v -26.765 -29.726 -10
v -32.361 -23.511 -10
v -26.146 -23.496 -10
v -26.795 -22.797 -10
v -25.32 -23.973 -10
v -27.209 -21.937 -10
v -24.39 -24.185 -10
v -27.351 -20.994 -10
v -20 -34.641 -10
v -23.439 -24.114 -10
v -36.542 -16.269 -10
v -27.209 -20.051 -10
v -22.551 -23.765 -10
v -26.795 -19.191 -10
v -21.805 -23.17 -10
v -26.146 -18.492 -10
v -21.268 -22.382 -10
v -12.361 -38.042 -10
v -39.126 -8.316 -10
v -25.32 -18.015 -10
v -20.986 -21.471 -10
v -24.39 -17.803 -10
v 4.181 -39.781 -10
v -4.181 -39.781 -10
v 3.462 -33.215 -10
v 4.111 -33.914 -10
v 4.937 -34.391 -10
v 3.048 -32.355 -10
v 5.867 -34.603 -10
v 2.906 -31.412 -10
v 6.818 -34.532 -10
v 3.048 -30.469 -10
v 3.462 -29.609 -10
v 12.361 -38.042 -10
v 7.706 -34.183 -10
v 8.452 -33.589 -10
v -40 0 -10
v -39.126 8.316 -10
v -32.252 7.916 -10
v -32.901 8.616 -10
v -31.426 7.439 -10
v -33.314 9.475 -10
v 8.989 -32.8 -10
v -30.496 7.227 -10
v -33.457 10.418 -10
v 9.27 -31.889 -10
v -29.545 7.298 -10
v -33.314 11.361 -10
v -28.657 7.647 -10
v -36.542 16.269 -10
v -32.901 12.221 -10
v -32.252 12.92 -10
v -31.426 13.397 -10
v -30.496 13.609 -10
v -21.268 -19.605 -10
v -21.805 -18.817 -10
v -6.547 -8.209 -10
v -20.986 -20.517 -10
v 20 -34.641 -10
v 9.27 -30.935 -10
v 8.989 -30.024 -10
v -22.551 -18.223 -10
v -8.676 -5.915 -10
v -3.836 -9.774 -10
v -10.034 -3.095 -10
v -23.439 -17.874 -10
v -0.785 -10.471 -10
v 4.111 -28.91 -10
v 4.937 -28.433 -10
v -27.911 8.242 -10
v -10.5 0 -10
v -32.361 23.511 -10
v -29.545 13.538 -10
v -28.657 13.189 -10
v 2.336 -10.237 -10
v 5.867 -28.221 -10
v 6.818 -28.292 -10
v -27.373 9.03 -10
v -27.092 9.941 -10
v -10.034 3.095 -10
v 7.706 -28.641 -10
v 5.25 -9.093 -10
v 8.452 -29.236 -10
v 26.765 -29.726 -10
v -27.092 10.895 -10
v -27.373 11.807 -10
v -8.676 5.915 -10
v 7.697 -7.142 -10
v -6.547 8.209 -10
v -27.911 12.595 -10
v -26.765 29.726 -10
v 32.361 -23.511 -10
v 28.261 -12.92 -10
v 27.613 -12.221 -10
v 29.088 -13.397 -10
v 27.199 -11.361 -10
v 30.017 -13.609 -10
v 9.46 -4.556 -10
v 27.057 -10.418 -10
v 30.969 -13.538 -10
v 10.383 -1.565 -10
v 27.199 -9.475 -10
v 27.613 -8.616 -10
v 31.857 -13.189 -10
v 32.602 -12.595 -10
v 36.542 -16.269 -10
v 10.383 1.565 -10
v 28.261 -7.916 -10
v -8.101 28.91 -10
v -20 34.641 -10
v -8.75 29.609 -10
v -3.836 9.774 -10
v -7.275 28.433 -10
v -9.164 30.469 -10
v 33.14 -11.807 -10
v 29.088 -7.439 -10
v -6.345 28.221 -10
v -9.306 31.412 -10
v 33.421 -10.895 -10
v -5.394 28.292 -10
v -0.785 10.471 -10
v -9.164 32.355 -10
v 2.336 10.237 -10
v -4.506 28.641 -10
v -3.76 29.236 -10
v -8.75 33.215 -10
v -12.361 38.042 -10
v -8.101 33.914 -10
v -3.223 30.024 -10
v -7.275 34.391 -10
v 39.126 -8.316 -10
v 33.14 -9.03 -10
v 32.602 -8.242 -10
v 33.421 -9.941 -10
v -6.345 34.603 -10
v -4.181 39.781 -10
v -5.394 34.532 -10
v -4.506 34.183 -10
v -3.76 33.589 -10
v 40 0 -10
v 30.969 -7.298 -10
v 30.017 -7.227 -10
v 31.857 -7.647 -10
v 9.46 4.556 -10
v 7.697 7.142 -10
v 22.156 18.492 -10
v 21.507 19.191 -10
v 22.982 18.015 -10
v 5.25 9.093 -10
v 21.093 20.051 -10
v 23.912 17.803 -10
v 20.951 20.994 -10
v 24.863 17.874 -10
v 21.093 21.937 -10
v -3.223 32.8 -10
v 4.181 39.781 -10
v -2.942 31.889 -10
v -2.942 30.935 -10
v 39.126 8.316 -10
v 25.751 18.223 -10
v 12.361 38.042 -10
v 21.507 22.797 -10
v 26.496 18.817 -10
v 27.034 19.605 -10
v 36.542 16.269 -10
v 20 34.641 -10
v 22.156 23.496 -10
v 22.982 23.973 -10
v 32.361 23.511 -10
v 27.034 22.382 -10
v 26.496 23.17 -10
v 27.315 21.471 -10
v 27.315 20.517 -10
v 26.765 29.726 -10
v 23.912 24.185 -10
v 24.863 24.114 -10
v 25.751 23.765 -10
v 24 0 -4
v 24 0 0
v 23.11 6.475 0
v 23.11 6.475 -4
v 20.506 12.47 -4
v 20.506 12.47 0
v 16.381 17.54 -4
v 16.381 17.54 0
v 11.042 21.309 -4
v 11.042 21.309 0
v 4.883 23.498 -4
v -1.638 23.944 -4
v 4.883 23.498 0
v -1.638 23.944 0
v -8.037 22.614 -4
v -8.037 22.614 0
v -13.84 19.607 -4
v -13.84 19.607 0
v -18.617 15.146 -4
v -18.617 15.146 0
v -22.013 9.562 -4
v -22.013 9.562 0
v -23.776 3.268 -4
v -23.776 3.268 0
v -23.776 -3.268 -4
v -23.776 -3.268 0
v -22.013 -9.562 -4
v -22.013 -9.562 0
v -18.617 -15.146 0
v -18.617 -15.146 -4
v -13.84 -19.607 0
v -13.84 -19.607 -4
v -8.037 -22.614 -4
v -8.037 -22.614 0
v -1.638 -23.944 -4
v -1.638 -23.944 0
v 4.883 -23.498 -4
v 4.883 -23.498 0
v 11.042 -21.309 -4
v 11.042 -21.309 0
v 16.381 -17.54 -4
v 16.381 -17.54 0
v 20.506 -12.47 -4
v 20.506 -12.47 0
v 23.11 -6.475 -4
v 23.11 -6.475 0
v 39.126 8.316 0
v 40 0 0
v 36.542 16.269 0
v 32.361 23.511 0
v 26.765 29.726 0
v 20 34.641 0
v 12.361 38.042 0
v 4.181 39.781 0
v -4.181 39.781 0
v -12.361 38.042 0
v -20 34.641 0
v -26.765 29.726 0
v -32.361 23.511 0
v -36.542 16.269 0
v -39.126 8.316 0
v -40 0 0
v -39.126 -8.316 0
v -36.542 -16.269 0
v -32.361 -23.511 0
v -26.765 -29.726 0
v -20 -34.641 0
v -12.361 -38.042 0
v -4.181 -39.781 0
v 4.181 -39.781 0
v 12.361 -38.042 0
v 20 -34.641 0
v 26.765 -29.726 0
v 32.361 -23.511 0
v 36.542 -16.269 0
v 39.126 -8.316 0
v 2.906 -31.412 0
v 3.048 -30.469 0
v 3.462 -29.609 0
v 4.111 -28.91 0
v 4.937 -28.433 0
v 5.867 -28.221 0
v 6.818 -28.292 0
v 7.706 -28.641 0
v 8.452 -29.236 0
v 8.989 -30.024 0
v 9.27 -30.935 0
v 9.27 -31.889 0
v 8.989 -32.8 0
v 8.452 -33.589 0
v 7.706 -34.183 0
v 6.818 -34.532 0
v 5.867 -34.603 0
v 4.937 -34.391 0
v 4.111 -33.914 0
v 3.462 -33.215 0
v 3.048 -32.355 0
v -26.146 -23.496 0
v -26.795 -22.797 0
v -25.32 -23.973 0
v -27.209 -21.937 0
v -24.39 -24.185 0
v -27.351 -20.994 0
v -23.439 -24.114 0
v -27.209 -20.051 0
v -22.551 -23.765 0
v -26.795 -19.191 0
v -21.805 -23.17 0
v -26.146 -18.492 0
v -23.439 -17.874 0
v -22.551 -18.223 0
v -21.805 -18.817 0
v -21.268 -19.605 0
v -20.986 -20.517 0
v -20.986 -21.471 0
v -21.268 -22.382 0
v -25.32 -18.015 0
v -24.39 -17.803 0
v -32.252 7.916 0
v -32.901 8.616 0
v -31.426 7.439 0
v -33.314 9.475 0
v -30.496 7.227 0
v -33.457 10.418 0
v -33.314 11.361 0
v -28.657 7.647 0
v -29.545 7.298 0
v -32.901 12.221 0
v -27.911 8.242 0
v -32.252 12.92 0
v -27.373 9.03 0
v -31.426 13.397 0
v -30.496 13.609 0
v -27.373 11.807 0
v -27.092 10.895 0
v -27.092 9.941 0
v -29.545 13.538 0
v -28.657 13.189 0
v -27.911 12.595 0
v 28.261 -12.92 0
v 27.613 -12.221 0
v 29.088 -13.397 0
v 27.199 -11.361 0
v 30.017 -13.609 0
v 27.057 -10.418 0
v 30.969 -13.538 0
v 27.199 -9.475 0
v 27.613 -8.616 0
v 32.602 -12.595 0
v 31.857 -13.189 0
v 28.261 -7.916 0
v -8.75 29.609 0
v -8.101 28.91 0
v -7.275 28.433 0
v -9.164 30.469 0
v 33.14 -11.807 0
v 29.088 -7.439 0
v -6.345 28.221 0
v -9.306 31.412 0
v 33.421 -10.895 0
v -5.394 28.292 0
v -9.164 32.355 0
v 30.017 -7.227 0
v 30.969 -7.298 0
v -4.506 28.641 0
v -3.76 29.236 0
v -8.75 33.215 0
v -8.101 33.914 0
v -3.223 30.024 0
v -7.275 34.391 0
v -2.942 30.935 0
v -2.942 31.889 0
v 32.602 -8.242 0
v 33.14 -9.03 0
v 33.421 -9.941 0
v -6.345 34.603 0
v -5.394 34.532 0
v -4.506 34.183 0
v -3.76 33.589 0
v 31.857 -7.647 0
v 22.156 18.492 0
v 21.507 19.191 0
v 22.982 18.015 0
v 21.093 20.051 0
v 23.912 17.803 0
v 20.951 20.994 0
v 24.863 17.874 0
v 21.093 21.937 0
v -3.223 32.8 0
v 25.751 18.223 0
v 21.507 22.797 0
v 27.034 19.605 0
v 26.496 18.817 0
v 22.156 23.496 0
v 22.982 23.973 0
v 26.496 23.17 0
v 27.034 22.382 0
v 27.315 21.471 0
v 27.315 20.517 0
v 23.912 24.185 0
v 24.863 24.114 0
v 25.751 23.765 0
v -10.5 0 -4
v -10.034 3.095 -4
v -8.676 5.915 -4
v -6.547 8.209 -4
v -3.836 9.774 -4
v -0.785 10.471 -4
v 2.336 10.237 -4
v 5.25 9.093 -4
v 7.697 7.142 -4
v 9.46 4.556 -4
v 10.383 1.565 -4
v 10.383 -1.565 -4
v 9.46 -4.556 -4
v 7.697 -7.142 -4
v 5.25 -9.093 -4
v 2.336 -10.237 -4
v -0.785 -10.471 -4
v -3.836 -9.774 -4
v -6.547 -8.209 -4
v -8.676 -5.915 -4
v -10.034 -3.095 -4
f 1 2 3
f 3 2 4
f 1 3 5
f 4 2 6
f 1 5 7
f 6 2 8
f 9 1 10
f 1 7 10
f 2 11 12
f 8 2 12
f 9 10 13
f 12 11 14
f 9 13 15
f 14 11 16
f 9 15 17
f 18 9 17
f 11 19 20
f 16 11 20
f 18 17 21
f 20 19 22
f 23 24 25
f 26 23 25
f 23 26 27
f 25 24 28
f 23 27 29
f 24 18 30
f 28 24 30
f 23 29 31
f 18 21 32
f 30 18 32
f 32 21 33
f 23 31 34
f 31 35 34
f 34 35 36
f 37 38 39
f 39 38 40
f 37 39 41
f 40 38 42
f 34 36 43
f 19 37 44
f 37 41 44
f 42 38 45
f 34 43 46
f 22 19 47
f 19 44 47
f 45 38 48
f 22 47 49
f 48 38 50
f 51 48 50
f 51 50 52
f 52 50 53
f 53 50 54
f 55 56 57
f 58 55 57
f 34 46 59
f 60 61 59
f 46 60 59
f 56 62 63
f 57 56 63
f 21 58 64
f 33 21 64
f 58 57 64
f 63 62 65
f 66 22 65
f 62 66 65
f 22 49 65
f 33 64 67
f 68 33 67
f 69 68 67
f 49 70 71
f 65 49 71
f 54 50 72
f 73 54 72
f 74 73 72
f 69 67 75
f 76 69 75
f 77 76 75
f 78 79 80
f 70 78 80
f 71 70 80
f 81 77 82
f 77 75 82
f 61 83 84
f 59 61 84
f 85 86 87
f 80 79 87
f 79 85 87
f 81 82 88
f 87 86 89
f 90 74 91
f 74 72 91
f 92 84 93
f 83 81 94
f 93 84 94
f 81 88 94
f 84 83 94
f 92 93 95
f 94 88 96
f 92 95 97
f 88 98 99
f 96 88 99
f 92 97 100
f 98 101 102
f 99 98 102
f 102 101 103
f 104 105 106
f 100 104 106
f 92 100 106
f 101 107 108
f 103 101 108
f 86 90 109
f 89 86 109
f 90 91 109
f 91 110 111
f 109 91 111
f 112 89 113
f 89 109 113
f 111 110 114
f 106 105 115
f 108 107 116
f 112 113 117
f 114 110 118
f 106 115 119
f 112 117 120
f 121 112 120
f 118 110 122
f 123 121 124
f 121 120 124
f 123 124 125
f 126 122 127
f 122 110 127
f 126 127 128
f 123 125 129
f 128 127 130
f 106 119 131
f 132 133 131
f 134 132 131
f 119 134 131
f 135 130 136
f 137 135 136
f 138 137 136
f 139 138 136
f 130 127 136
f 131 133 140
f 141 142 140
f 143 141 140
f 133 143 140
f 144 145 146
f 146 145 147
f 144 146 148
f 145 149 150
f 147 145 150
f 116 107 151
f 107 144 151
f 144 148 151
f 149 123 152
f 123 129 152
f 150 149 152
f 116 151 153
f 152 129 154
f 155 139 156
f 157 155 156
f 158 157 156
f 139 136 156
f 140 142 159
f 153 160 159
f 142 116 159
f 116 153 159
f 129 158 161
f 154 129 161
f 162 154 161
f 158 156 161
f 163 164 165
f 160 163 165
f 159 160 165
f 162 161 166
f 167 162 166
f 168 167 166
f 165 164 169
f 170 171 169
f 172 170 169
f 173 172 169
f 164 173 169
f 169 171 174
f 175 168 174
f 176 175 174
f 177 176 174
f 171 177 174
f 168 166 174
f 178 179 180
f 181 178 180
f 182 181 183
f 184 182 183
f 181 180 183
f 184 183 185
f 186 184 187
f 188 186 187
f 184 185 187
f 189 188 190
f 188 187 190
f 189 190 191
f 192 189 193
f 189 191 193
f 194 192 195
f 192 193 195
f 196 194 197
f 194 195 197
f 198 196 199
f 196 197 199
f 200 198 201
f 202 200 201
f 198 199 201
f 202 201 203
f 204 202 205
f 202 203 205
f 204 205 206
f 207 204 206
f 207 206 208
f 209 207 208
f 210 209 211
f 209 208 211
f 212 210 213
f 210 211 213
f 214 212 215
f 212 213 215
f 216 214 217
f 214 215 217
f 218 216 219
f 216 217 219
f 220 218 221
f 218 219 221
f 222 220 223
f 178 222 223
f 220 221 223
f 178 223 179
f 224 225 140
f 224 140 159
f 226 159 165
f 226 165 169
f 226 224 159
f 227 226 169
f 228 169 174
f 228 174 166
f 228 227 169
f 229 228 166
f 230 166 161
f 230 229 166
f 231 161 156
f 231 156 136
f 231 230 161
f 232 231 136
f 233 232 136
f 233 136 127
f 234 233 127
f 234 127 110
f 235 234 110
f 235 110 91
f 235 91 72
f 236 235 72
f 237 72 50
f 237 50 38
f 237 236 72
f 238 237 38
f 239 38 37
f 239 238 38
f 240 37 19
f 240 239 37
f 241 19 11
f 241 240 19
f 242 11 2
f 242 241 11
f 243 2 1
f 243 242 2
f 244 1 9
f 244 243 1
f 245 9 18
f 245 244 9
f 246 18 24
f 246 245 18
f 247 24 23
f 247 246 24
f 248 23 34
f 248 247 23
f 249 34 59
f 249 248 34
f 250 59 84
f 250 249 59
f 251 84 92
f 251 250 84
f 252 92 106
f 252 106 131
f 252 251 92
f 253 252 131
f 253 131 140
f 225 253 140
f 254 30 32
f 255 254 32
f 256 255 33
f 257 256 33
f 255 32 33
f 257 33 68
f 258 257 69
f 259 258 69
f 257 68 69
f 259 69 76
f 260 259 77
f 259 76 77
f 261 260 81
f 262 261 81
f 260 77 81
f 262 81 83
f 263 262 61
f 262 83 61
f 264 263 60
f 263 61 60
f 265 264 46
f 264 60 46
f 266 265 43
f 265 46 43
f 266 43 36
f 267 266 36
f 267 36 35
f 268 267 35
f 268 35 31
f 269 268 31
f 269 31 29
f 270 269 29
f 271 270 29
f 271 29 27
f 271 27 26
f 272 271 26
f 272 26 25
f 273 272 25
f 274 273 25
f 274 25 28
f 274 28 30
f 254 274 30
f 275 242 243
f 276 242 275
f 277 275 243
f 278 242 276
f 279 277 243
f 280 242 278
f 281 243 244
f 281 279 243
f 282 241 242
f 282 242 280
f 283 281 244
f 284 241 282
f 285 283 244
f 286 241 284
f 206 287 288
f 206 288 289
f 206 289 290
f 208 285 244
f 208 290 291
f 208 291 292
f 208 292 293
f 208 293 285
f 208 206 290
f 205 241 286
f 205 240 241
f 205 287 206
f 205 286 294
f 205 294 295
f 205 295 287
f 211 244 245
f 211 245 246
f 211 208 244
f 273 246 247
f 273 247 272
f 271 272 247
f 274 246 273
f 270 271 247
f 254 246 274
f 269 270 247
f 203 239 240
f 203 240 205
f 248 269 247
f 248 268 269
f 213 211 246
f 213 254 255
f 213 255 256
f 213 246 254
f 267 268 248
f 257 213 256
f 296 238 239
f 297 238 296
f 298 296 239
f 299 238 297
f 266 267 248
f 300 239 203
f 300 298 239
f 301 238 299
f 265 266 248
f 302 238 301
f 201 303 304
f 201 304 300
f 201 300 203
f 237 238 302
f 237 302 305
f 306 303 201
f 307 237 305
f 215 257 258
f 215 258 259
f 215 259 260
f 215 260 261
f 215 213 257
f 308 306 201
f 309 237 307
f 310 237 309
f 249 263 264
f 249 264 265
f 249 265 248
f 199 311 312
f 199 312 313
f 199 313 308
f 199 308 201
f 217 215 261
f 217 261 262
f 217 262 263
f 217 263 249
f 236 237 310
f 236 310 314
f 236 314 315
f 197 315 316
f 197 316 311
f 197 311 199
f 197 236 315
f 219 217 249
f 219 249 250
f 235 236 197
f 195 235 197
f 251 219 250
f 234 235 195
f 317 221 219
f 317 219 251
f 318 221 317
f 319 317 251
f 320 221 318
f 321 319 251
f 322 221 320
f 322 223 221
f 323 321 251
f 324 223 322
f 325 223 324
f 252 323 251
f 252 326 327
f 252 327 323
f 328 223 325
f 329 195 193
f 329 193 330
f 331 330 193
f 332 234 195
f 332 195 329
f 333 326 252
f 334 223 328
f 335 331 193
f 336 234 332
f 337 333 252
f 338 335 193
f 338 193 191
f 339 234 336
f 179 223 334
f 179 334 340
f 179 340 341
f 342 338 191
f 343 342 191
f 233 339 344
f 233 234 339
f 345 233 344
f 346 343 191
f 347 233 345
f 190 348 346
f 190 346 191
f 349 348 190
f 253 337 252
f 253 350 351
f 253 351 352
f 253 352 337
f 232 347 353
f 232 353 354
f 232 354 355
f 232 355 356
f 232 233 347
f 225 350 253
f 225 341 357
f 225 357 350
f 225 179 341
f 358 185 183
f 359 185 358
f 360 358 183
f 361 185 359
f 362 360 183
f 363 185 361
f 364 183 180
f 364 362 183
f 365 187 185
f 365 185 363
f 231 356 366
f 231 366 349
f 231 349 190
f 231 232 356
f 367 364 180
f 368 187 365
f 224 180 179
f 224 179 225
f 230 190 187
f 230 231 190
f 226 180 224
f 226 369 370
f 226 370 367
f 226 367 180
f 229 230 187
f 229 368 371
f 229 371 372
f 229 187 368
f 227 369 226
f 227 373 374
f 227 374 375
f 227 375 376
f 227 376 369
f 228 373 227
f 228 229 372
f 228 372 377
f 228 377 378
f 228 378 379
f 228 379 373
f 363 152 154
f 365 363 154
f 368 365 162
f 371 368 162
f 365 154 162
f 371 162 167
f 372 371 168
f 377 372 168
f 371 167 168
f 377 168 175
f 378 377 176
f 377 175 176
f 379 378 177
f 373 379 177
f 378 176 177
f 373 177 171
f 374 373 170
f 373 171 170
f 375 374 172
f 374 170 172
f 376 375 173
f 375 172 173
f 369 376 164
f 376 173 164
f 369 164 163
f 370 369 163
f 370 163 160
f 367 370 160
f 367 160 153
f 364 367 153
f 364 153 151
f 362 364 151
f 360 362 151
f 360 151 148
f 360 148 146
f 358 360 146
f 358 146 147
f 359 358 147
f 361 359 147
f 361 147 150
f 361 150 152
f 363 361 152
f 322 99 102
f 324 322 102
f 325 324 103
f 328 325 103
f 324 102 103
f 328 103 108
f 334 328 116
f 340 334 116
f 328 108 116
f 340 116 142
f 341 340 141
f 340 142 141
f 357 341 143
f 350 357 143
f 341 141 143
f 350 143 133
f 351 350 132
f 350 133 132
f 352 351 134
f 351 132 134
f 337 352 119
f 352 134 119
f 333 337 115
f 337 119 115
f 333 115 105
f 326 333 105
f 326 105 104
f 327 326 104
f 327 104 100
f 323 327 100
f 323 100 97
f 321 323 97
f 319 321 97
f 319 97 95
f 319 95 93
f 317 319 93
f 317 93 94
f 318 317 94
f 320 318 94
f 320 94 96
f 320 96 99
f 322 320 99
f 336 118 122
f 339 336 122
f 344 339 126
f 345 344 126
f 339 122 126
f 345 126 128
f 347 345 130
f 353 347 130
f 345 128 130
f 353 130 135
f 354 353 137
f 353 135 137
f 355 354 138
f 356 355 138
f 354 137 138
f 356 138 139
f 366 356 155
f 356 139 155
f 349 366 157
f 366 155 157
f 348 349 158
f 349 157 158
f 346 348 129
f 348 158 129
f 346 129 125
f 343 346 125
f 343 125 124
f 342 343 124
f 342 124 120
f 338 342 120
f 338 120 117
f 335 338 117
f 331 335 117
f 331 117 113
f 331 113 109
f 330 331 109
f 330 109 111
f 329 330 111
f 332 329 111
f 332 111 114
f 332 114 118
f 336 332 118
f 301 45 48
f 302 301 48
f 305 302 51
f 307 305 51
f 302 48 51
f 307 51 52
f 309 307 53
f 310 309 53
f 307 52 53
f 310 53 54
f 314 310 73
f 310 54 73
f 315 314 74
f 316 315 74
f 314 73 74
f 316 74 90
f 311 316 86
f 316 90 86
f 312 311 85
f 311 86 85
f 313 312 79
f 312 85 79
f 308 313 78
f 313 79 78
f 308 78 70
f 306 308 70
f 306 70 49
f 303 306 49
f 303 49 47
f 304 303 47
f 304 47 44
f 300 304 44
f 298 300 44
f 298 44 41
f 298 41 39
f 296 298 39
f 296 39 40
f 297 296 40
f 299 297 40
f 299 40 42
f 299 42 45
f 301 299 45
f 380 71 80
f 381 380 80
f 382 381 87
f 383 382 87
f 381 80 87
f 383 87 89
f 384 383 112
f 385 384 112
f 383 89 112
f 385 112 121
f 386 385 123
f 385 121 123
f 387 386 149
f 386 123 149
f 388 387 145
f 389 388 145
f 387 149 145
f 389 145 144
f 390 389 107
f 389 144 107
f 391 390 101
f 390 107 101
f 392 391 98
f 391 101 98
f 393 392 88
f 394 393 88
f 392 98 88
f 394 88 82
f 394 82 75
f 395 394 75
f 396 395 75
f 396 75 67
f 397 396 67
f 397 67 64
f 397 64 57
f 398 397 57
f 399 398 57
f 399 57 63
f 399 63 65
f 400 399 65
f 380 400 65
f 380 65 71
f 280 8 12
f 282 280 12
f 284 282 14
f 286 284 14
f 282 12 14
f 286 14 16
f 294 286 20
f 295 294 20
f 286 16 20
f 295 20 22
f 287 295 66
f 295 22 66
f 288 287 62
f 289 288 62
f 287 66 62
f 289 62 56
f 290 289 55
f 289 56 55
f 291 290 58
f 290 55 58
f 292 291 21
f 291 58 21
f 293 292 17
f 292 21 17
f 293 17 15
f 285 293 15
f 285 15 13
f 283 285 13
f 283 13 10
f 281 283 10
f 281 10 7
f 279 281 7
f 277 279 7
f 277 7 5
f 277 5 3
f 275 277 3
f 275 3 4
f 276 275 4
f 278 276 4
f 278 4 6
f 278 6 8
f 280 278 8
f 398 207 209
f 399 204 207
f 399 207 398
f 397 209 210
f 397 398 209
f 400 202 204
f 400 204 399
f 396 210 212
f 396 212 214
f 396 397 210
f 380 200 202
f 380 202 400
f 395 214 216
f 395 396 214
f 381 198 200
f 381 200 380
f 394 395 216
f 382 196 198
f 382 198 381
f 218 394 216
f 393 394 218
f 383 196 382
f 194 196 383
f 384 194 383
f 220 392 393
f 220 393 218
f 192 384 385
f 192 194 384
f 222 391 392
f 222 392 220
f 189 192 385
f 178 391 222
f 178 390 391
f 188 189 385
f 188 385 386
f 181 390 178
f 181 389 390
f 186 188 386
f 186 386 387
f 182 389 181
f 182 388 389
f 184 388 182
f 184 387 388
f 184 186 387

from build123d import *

# Parameters (mm, degrees)
F0_R          = 40
F1_DEPTH      = 10
F2_R          = 24
F3_DEPTH      = 4
F3_DEPTH_BACK = 10
F6_D          = 21
F7_D          = 6.4


with BuildPart() as f1:
    # F0 (on Top) → F1 (new body)
    with BuildSketch(Plane.XY):
        Circle(F0_R)
    extrude(amount=-F1_DEPTH)

    # F2 (on Top) → F3 (cut, two sides)
    with BuildSketch(Plane.XY) as f3_sk:
        Circle(F2_R)
    extrude(amount=-F3_DEPTH, mode=Mode.SUBTRACT)
    extrude(f3_sk.sketch, amount=F3_DEPTH_BACK, mode=Mode.SUBTRACT)

    # F6 (through all)
    with Locations(Plane.XY.offset(-4)):
        with Locations((0, 0)):
            Hole(F6_D / 2)

    # F7 (through all)
    with Locations(Plane.XY):
        with Locations((-6.105887852, 31.4120698703), (24.1507065671, 20.9938889277), (30.2565944192, -10.4181809426), (6.105887852, -31.4120698703), (-24.1507065671, -20.9938889277), (-30.2565944192, 10.4181809426)):
            Hole(F7_D / 2)


solid = f1.part
